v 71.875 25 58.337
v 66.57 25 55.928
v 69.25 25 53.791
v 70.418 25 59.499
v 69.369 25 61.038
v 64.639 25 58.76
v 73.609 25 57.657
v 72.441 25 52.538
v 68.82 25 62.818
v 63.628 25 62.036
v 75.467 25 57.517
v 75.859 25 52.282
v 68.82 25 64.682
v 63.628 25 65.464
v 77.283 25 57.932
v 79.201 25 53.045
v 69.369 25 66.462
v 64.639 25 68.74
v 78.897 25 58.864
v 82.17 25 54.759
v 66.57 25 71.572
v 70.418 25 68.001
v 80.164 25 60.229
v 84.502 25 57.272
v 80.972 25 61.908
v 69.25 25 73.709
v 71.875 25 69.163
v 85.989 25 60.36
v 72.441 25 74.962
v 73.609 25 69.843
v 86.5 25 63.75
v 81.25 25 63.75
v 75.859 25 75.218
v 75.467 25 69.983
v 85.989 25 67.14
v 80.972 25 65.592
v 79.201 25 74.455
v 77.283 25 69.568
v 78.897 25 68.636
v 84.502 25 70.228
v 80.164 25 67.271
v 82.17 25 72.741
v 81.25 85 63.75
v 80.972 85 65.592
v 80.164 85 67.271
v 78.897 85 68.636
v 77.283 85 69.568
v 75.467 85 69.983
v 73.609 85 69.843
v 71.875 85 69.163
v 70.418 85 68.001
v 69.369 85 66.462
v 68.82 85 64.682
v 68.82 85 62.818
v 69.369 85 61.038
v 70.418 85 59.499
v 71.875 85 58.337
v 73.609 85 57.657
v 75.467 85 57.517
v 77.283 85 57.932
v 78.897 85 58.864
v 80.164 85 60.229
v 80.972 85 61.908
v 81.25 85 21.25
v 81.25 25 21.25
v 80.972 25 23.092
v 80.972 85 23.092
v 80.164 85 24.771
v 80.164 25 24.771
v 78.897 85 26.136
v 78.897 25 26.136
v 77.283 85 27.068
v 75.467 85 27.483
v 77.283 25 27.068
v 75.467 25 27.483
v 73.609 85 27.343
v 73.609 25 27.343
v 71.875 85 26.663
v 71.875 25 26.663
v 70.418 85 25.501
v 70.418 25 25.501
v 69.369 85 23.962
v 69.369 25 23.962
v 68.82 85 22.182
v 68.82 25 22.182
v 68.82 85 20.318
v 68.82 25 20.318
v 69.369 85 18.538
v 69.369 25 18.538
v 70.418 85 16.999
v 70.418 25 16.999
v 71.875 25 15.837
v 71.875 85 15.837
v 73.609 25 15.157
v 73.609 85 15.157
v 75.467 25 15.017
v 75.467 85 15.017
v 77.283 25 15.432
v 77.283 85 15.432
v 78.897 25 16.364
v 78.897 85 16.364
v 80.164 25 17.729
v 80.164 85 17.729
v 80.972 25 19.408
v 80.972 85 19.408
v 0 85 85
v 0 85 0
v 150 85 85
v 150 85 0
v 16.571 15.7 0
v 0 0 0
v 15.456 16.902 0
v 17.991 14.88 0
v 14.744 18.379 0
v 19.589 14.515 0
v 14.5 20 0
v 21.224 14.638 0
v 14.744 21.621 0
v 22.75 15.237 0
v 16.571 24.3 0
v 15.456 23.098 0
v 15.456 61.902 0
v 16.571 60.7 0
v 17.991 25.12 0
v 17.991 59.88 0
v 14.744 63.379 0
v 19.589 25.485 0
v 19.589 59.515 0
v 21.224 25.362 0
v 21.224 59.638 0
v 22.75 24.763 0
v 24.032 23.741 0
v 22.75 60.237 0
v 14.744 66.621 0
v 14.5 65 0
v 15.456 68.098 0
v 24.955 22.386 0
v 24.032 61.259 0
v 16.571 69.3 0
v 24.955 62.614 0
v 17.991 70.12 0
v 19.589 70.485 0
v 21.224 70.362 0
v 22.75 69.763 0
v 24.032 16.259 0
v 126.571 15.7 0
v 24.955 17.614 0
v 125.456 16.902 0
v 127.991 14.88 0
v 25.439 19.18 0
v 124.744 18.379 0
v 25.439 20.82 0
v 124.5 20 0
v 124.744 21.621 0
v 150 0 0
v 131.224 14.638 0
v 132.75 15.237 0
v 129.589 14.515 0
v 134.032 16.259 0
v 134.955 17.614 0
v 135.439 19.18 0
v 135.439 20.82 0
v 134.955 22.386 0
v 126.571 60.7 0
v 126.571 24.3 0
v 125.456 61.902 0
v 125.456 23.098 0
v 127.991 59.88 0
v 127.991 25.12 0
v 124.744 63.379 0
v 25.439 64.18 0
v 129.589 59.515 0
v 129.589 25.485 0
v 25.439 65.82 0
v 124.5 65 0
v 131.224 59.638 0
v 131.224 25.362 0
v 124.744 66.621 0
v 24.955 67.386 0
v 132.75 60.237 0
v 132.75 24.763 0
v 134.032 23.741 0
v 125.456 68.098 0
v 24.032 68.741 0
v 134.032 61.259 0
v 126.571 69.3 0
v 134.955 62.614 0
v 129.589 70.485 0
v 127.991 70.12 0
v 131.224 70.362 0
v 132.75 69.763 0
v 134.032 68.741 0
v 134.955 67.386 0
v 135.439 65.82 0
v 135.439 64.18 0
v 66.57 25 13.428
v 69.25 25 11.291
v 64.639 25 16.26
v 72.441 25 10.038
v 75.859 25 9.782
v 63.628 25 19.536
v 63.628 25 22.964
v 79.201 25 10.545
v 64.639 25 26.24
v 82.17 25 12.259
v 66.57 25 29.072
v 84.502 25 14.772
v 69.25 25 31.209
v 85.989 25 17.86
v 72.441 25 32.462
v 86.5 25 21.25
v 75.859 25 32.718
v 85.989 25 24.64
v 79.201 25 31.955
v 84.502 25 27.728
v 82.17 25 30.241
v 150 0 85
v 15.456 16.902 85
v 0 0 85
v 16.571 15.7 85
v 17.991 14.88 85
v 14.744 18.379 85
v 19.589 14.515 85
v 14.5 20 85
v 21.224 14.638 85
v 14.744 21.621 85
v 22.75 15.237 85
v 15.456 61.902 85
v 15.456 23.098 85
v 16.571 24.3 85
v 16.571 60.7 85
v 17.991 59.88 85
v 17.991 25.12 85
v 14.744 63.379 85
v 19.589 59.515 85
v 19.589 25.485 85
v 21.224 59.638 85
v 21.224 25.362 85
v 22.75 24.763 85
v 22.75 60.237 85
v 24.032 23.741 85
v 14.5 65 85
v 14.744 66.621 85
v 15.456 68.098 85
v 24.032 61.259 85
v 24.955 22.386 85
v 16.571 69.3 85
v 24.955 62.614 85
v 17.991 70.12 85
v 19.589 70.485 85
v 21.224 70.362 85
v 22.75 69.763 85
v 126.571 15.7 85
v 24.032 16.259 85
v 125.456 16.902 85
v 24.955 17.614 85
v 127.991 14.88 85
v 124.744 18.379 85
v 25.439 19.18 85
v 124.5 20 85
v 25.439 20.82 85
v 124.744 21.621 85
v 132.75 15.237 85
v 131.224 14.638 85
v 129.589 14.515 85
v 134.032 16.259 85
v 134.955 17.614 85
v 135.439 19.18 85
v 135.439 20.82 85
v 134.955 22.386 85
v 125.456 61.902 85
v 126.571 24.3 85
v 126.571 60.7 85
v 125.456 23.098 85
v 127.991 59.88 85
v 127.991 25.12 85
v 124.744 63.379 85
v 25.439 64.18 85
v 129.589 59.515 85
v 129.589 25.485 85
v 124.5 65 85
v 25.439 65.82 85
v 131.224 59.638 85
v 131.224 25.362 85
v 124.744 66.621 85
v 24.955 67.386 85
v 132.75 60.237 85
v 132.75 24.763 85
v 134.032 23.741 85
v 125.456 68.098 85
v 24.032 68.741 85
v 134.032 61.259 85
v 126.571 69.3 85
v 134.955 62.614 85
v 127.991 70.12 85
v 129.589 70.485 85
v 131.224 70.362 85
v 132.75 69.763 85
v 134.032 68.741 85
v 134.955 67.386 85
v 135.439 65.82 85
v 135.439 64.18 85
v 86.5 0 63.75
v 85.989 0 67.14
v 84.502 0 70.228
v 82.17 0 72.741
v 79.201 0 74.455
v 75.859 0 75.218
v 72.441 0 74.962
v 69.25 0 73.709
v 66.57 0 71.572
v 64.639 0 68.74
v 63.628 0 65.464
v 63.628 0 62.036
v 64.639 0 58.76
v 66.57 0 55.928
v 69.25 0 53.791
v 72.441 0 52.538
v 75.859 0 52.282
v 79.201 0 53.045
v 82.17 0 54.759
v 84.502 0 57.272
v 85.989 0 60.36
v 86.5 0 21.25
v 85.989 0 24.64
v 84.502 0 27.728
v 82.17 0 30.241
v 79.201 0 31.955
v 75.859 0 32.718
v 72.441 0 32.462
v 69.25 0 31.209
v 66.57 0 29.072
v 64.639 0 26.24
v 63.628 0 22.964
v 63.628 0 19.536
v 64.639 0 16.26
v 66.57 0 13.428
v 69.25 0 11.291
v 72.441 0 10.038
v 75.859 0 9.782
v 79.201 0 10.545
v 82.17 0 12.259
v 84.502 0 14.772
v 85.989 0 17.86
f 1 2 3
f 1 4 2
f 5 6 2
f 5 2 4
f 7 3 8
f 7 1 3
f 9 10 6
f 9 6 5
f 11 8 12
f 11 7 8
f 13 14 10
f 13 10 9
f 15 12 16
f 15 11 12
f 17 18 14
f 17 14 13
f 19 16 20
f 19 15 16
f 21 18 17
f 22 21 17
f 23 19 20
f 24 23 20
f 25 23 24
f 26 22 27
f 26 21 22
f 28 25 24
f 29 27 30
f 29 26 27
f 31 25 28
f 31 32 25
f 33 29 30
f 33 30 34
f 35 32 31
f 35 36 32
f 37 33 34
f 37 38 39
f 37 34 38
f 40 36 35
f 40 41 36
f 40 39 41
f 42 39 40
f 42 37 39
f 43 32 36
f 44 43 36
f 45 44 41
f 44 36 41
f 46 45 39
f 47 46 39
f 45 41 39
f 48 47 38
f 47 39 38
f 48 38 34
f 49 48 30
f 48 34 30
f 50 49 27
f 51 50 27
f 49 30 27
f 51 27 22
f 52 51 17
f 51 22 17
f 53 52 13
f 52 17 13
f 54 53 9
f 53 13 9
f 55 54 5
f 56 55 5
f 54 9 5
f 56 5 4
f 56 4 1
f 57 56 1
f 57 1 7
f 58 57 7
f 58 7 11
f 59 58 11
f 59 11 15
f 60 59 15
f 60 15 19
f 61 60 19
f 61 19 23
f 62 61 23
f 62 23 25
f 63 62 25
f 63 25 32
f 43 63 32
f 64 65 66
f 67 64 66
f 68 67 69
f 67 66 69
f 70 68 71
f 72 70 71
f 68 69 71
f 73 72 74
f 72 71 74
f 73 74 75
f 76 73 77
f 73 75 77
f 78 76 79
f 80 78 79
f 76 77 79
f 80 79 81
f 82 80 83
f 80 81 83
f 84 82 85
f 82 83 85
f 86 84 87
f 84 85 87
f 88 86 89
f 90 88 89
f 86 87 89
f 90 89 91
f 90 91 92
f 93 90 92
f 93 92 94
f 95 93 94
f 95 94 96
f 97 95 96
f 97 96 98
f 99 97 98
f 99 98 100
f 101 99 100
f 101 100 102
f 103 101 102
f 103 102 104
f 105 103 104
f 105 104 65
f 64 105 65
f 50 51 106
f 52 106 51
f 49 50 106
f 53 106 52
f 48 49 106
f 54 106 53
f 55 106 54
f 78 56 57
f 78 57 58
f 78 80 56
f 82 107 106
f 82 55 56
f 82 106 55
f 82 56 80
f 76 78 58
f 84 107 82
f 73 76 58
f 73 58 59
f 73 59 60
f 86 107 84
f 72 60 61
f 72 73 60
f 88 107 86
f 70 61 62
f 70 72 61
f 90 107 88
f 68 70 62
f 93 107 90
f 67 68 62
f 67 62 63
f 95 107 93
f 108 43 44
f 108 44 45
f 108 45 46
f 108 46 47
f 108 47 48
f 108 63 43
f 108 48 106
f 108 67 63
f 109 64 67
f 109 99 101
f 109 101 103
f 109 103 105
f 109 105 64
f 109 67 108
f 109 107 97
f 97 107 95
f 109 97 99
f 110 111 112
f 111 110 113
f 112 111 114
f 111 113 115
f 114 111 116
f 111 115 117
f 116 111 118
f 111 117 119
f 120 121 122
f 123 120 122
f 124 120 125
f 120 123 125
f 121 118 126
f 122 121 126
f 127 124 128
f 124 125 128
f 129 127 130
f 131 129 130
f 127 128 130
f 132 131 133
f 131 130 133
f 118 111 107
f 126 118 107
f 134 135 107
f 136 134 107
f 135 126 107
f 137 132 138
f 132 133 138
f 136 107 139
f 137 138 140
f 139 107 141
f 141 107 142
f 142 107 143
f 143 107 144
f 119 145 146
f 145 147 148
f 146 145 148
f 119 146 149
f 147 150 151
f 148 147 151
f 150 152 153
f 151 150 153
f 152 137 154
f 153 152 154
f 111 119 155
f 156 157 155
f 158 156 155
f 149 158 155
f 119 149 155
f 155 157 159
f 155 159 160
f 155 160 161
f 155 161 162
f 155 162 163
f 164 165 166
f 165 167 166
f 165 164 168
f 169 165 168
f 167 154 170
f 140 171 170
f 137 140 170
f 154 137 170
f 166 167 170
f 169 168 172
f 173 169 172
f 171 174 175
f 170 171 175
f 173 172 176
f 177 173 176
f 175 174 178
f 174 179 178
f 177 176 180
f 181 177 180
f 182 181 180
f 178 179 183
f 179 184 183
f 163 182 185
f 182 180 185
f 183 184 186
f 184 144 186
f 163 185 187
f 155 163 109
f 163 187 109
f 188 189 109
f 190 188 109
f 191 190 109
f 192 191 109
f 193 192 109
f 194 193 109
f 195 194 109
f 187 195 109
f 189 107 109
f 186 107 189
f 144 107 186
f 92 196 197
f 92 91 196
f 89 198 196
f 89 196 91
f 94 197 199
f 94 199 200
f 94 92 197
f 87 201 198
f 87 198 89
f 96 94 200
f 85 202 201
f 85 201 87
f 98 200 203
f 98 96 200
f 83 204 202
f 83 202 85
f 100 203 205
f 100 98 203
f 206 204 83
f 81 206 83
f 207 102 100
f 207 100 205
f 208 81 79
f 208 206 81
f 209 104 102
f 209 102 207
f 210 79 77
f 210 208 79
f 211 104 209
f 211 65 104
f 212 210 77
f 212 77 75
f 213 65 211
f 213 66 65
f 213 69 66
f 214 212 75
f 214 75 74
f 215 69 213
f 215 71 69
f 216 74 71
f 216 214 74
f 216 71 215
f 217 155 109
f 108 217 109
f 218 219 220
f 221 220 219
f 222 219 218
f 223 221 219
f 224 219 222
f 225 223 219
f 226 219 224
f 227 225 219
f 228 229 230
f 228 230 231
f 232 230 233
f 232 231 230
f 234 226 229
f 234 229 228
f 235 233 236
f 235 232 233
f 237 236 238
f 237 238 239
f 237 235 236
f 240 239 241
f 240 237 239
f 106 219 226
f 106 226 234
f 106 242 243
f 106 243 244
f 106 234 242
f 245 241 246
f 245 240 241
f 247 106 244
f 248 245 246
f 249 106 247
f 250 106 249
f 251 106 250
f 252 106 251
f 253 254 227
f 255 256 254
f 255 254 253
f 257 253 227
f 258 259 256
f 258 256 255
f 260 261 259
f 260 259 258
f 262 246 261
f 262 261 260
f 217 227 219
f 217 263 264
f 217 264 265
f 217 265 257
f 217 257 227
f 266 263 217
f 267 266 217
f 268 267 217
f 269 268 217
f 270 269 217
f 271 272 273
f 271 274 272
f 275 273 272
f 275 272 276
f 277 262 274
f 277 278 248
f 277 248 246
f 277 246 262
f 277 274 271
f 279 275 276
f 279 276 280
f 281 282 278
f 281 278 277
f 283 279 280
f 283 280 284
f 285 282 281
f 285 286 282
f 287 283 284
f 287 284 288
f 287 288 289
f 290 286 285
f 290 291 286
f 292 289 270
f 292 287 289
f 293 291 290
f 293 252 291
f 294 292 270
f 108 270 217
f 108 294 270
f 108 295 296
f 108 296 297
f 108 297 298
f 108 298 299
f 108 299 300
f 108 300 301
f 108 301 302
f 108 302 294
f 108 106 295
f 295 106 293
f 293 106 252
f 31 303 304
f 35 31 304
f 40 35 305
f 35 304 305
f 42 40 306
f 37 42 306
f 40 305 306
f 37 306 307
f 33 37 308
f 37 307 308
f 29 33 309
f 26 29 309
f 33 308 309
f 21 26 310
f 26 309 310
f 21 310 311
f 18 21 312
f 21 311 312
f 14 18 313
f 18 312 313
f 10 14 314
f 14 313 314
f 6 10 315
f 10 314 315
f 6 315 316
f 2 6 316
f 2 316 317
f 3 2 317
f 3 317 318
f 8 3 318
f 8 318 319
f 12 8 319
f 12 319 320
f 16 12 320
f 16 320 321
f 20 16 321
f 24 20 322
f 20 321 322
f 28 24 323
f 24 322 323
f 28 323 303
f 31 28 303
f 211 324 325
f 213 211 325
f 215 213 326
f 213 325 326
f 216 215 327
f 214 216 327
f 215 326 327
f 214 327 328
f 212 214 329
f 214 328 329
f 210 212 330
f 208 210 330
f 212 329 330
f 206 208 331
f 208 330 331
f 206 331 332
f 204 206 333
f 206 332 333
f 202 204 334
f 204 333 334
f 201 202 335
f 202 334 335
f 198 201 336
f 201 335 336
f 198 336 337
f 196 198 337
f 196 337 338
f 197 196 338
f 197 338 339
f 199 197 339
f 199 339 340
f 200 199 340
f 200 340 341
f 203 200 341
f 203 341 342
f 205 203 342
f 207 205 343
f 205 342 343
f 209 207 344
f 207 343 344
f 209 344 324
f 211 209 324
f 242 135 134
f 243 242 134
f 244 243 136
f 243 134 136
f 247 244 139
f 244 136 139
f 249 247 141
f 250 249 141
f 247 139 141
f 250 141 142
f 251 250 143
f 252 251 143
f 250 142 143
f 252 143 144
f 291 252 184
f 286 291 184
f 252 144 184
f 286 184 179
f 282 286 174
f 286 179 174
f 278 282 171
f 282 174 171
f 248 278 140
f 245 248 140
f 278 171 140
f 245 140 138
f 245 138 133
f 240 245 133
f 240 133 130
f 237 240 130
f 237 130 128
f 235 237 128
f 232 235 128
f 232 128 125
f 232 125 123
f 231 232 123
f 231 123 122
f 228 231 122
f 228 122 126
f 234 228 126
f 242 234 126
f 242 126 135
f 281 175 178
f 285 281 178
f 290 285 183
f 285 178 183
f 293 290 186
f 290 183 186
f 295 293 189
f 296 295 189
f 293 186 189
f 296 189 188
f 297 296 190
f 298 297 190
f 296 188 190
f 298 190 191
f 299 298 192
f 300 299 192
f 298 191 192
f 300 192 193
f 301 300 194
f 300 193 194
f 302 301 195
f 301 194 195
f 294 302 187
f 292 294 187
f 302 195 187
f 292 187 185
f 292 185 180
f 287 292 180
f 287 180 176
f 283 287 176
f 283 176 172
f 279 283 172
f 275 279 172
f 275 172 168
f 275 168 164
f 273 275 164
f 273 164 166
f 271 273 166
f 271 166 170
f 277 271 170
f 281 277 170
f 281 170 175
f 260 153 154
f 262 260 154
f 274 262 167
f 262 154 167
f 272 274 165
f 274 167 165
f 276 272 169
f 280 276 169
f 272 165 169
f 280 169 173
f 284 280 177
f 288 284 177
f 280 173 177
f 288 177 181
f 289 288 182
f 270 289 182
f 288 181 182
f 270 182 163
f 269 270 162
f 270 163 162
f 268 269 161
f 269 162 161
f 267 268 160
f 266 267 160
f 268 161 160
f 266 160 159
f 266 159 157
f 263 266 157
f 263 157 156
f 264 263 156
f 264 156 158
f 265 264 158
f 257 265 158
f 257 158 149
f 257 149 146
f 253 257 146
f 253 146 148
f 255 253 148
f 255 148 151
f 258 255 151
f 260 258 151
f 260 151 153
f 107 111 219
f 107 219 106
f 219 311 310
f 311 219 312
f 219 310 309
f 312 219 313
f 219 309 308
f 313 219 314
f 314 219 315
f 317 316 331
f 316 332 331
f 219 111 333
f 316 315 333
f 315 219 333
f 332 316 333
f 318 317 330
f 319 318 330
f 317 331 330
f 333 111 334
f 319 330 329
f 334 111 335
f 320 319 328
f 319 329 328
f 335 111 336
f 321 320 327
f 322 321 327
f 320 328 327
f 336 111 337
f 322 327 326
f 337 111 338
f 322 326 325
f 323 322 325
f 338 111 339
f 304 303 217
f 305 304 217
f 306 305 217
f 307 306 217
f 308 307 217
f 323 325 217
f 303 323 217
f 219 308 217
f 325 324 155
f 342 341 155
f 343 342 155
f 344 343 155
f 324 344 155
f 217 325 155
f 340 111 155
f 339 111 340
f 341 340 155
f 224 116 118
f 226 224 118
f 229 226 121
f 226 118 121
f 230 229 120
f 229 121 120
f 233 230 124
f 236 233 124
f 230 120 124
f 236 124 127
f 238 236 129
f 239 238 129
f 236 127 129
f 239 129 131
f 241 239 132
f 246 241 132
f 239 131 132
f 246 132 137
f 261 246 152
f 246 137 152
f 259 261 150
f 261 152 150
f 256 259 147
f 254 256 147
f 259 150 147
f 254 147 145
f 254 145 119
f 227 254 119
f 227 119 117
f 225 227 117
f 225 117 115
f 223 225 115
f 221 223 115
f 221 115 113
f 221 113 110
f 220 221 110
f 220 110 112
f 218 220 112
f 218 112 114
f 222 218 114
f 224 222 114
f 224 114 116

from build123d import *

# Parameters (mm, degrees)
F0_W     = 150
F0_H     = 85
F1_DEPTH = 85
F2_R     = 6.25
F3_DEPTH = 85.001
F2_R_2   = 11.5
F4_DEPTH = 25
F6_D     = 11


with BuildPart() as f1:
    # F0 (on Top) → F1 (new body)
    with BuildSketch(Plane.XY):
        with Locations((75, 42.5)):
            Rectangle(F0_W, F0_H)
    extrude(amount=F1_DEPTH)

    # F2 (on face) → F3 (cut, through all)
    with BuildSketch(Plane.XZ):
        with Locations((75, 63.75)):
            Circle(F2_R)
        with Locations((75, 21.25)):
            Circle(F2_R)
    extrude(amount=-F3_DEPTH, mode=Mode.SUBTRACT)

    # F2 (on face) → F4 (cut)
    with BuildSketch(Plane.XZ):
        with Locations((75, 63.75)):
            Circle(F2_R_2)
        with Locations((75, 63.75)):
            Circle(F2_R, mode=Mode.SUBTRACT)
        with Locations((75, 21.25)):
            Circle(F2_R_2)
        with Locations((75, 21.25)):
            Circle(F2_R, mode=Mode.SUBTRACT)
    extrude(amount=-F4_DEPTH, mode=Mode.SUBTRACT)

    # F6 (through all)
    with Locations(Plane.XY.offset(85)):
        with Locations((20, 65), (20, 20), (130, 20), (130, 65)):
            Hole(F6_D / 2)


solid = f1.part
